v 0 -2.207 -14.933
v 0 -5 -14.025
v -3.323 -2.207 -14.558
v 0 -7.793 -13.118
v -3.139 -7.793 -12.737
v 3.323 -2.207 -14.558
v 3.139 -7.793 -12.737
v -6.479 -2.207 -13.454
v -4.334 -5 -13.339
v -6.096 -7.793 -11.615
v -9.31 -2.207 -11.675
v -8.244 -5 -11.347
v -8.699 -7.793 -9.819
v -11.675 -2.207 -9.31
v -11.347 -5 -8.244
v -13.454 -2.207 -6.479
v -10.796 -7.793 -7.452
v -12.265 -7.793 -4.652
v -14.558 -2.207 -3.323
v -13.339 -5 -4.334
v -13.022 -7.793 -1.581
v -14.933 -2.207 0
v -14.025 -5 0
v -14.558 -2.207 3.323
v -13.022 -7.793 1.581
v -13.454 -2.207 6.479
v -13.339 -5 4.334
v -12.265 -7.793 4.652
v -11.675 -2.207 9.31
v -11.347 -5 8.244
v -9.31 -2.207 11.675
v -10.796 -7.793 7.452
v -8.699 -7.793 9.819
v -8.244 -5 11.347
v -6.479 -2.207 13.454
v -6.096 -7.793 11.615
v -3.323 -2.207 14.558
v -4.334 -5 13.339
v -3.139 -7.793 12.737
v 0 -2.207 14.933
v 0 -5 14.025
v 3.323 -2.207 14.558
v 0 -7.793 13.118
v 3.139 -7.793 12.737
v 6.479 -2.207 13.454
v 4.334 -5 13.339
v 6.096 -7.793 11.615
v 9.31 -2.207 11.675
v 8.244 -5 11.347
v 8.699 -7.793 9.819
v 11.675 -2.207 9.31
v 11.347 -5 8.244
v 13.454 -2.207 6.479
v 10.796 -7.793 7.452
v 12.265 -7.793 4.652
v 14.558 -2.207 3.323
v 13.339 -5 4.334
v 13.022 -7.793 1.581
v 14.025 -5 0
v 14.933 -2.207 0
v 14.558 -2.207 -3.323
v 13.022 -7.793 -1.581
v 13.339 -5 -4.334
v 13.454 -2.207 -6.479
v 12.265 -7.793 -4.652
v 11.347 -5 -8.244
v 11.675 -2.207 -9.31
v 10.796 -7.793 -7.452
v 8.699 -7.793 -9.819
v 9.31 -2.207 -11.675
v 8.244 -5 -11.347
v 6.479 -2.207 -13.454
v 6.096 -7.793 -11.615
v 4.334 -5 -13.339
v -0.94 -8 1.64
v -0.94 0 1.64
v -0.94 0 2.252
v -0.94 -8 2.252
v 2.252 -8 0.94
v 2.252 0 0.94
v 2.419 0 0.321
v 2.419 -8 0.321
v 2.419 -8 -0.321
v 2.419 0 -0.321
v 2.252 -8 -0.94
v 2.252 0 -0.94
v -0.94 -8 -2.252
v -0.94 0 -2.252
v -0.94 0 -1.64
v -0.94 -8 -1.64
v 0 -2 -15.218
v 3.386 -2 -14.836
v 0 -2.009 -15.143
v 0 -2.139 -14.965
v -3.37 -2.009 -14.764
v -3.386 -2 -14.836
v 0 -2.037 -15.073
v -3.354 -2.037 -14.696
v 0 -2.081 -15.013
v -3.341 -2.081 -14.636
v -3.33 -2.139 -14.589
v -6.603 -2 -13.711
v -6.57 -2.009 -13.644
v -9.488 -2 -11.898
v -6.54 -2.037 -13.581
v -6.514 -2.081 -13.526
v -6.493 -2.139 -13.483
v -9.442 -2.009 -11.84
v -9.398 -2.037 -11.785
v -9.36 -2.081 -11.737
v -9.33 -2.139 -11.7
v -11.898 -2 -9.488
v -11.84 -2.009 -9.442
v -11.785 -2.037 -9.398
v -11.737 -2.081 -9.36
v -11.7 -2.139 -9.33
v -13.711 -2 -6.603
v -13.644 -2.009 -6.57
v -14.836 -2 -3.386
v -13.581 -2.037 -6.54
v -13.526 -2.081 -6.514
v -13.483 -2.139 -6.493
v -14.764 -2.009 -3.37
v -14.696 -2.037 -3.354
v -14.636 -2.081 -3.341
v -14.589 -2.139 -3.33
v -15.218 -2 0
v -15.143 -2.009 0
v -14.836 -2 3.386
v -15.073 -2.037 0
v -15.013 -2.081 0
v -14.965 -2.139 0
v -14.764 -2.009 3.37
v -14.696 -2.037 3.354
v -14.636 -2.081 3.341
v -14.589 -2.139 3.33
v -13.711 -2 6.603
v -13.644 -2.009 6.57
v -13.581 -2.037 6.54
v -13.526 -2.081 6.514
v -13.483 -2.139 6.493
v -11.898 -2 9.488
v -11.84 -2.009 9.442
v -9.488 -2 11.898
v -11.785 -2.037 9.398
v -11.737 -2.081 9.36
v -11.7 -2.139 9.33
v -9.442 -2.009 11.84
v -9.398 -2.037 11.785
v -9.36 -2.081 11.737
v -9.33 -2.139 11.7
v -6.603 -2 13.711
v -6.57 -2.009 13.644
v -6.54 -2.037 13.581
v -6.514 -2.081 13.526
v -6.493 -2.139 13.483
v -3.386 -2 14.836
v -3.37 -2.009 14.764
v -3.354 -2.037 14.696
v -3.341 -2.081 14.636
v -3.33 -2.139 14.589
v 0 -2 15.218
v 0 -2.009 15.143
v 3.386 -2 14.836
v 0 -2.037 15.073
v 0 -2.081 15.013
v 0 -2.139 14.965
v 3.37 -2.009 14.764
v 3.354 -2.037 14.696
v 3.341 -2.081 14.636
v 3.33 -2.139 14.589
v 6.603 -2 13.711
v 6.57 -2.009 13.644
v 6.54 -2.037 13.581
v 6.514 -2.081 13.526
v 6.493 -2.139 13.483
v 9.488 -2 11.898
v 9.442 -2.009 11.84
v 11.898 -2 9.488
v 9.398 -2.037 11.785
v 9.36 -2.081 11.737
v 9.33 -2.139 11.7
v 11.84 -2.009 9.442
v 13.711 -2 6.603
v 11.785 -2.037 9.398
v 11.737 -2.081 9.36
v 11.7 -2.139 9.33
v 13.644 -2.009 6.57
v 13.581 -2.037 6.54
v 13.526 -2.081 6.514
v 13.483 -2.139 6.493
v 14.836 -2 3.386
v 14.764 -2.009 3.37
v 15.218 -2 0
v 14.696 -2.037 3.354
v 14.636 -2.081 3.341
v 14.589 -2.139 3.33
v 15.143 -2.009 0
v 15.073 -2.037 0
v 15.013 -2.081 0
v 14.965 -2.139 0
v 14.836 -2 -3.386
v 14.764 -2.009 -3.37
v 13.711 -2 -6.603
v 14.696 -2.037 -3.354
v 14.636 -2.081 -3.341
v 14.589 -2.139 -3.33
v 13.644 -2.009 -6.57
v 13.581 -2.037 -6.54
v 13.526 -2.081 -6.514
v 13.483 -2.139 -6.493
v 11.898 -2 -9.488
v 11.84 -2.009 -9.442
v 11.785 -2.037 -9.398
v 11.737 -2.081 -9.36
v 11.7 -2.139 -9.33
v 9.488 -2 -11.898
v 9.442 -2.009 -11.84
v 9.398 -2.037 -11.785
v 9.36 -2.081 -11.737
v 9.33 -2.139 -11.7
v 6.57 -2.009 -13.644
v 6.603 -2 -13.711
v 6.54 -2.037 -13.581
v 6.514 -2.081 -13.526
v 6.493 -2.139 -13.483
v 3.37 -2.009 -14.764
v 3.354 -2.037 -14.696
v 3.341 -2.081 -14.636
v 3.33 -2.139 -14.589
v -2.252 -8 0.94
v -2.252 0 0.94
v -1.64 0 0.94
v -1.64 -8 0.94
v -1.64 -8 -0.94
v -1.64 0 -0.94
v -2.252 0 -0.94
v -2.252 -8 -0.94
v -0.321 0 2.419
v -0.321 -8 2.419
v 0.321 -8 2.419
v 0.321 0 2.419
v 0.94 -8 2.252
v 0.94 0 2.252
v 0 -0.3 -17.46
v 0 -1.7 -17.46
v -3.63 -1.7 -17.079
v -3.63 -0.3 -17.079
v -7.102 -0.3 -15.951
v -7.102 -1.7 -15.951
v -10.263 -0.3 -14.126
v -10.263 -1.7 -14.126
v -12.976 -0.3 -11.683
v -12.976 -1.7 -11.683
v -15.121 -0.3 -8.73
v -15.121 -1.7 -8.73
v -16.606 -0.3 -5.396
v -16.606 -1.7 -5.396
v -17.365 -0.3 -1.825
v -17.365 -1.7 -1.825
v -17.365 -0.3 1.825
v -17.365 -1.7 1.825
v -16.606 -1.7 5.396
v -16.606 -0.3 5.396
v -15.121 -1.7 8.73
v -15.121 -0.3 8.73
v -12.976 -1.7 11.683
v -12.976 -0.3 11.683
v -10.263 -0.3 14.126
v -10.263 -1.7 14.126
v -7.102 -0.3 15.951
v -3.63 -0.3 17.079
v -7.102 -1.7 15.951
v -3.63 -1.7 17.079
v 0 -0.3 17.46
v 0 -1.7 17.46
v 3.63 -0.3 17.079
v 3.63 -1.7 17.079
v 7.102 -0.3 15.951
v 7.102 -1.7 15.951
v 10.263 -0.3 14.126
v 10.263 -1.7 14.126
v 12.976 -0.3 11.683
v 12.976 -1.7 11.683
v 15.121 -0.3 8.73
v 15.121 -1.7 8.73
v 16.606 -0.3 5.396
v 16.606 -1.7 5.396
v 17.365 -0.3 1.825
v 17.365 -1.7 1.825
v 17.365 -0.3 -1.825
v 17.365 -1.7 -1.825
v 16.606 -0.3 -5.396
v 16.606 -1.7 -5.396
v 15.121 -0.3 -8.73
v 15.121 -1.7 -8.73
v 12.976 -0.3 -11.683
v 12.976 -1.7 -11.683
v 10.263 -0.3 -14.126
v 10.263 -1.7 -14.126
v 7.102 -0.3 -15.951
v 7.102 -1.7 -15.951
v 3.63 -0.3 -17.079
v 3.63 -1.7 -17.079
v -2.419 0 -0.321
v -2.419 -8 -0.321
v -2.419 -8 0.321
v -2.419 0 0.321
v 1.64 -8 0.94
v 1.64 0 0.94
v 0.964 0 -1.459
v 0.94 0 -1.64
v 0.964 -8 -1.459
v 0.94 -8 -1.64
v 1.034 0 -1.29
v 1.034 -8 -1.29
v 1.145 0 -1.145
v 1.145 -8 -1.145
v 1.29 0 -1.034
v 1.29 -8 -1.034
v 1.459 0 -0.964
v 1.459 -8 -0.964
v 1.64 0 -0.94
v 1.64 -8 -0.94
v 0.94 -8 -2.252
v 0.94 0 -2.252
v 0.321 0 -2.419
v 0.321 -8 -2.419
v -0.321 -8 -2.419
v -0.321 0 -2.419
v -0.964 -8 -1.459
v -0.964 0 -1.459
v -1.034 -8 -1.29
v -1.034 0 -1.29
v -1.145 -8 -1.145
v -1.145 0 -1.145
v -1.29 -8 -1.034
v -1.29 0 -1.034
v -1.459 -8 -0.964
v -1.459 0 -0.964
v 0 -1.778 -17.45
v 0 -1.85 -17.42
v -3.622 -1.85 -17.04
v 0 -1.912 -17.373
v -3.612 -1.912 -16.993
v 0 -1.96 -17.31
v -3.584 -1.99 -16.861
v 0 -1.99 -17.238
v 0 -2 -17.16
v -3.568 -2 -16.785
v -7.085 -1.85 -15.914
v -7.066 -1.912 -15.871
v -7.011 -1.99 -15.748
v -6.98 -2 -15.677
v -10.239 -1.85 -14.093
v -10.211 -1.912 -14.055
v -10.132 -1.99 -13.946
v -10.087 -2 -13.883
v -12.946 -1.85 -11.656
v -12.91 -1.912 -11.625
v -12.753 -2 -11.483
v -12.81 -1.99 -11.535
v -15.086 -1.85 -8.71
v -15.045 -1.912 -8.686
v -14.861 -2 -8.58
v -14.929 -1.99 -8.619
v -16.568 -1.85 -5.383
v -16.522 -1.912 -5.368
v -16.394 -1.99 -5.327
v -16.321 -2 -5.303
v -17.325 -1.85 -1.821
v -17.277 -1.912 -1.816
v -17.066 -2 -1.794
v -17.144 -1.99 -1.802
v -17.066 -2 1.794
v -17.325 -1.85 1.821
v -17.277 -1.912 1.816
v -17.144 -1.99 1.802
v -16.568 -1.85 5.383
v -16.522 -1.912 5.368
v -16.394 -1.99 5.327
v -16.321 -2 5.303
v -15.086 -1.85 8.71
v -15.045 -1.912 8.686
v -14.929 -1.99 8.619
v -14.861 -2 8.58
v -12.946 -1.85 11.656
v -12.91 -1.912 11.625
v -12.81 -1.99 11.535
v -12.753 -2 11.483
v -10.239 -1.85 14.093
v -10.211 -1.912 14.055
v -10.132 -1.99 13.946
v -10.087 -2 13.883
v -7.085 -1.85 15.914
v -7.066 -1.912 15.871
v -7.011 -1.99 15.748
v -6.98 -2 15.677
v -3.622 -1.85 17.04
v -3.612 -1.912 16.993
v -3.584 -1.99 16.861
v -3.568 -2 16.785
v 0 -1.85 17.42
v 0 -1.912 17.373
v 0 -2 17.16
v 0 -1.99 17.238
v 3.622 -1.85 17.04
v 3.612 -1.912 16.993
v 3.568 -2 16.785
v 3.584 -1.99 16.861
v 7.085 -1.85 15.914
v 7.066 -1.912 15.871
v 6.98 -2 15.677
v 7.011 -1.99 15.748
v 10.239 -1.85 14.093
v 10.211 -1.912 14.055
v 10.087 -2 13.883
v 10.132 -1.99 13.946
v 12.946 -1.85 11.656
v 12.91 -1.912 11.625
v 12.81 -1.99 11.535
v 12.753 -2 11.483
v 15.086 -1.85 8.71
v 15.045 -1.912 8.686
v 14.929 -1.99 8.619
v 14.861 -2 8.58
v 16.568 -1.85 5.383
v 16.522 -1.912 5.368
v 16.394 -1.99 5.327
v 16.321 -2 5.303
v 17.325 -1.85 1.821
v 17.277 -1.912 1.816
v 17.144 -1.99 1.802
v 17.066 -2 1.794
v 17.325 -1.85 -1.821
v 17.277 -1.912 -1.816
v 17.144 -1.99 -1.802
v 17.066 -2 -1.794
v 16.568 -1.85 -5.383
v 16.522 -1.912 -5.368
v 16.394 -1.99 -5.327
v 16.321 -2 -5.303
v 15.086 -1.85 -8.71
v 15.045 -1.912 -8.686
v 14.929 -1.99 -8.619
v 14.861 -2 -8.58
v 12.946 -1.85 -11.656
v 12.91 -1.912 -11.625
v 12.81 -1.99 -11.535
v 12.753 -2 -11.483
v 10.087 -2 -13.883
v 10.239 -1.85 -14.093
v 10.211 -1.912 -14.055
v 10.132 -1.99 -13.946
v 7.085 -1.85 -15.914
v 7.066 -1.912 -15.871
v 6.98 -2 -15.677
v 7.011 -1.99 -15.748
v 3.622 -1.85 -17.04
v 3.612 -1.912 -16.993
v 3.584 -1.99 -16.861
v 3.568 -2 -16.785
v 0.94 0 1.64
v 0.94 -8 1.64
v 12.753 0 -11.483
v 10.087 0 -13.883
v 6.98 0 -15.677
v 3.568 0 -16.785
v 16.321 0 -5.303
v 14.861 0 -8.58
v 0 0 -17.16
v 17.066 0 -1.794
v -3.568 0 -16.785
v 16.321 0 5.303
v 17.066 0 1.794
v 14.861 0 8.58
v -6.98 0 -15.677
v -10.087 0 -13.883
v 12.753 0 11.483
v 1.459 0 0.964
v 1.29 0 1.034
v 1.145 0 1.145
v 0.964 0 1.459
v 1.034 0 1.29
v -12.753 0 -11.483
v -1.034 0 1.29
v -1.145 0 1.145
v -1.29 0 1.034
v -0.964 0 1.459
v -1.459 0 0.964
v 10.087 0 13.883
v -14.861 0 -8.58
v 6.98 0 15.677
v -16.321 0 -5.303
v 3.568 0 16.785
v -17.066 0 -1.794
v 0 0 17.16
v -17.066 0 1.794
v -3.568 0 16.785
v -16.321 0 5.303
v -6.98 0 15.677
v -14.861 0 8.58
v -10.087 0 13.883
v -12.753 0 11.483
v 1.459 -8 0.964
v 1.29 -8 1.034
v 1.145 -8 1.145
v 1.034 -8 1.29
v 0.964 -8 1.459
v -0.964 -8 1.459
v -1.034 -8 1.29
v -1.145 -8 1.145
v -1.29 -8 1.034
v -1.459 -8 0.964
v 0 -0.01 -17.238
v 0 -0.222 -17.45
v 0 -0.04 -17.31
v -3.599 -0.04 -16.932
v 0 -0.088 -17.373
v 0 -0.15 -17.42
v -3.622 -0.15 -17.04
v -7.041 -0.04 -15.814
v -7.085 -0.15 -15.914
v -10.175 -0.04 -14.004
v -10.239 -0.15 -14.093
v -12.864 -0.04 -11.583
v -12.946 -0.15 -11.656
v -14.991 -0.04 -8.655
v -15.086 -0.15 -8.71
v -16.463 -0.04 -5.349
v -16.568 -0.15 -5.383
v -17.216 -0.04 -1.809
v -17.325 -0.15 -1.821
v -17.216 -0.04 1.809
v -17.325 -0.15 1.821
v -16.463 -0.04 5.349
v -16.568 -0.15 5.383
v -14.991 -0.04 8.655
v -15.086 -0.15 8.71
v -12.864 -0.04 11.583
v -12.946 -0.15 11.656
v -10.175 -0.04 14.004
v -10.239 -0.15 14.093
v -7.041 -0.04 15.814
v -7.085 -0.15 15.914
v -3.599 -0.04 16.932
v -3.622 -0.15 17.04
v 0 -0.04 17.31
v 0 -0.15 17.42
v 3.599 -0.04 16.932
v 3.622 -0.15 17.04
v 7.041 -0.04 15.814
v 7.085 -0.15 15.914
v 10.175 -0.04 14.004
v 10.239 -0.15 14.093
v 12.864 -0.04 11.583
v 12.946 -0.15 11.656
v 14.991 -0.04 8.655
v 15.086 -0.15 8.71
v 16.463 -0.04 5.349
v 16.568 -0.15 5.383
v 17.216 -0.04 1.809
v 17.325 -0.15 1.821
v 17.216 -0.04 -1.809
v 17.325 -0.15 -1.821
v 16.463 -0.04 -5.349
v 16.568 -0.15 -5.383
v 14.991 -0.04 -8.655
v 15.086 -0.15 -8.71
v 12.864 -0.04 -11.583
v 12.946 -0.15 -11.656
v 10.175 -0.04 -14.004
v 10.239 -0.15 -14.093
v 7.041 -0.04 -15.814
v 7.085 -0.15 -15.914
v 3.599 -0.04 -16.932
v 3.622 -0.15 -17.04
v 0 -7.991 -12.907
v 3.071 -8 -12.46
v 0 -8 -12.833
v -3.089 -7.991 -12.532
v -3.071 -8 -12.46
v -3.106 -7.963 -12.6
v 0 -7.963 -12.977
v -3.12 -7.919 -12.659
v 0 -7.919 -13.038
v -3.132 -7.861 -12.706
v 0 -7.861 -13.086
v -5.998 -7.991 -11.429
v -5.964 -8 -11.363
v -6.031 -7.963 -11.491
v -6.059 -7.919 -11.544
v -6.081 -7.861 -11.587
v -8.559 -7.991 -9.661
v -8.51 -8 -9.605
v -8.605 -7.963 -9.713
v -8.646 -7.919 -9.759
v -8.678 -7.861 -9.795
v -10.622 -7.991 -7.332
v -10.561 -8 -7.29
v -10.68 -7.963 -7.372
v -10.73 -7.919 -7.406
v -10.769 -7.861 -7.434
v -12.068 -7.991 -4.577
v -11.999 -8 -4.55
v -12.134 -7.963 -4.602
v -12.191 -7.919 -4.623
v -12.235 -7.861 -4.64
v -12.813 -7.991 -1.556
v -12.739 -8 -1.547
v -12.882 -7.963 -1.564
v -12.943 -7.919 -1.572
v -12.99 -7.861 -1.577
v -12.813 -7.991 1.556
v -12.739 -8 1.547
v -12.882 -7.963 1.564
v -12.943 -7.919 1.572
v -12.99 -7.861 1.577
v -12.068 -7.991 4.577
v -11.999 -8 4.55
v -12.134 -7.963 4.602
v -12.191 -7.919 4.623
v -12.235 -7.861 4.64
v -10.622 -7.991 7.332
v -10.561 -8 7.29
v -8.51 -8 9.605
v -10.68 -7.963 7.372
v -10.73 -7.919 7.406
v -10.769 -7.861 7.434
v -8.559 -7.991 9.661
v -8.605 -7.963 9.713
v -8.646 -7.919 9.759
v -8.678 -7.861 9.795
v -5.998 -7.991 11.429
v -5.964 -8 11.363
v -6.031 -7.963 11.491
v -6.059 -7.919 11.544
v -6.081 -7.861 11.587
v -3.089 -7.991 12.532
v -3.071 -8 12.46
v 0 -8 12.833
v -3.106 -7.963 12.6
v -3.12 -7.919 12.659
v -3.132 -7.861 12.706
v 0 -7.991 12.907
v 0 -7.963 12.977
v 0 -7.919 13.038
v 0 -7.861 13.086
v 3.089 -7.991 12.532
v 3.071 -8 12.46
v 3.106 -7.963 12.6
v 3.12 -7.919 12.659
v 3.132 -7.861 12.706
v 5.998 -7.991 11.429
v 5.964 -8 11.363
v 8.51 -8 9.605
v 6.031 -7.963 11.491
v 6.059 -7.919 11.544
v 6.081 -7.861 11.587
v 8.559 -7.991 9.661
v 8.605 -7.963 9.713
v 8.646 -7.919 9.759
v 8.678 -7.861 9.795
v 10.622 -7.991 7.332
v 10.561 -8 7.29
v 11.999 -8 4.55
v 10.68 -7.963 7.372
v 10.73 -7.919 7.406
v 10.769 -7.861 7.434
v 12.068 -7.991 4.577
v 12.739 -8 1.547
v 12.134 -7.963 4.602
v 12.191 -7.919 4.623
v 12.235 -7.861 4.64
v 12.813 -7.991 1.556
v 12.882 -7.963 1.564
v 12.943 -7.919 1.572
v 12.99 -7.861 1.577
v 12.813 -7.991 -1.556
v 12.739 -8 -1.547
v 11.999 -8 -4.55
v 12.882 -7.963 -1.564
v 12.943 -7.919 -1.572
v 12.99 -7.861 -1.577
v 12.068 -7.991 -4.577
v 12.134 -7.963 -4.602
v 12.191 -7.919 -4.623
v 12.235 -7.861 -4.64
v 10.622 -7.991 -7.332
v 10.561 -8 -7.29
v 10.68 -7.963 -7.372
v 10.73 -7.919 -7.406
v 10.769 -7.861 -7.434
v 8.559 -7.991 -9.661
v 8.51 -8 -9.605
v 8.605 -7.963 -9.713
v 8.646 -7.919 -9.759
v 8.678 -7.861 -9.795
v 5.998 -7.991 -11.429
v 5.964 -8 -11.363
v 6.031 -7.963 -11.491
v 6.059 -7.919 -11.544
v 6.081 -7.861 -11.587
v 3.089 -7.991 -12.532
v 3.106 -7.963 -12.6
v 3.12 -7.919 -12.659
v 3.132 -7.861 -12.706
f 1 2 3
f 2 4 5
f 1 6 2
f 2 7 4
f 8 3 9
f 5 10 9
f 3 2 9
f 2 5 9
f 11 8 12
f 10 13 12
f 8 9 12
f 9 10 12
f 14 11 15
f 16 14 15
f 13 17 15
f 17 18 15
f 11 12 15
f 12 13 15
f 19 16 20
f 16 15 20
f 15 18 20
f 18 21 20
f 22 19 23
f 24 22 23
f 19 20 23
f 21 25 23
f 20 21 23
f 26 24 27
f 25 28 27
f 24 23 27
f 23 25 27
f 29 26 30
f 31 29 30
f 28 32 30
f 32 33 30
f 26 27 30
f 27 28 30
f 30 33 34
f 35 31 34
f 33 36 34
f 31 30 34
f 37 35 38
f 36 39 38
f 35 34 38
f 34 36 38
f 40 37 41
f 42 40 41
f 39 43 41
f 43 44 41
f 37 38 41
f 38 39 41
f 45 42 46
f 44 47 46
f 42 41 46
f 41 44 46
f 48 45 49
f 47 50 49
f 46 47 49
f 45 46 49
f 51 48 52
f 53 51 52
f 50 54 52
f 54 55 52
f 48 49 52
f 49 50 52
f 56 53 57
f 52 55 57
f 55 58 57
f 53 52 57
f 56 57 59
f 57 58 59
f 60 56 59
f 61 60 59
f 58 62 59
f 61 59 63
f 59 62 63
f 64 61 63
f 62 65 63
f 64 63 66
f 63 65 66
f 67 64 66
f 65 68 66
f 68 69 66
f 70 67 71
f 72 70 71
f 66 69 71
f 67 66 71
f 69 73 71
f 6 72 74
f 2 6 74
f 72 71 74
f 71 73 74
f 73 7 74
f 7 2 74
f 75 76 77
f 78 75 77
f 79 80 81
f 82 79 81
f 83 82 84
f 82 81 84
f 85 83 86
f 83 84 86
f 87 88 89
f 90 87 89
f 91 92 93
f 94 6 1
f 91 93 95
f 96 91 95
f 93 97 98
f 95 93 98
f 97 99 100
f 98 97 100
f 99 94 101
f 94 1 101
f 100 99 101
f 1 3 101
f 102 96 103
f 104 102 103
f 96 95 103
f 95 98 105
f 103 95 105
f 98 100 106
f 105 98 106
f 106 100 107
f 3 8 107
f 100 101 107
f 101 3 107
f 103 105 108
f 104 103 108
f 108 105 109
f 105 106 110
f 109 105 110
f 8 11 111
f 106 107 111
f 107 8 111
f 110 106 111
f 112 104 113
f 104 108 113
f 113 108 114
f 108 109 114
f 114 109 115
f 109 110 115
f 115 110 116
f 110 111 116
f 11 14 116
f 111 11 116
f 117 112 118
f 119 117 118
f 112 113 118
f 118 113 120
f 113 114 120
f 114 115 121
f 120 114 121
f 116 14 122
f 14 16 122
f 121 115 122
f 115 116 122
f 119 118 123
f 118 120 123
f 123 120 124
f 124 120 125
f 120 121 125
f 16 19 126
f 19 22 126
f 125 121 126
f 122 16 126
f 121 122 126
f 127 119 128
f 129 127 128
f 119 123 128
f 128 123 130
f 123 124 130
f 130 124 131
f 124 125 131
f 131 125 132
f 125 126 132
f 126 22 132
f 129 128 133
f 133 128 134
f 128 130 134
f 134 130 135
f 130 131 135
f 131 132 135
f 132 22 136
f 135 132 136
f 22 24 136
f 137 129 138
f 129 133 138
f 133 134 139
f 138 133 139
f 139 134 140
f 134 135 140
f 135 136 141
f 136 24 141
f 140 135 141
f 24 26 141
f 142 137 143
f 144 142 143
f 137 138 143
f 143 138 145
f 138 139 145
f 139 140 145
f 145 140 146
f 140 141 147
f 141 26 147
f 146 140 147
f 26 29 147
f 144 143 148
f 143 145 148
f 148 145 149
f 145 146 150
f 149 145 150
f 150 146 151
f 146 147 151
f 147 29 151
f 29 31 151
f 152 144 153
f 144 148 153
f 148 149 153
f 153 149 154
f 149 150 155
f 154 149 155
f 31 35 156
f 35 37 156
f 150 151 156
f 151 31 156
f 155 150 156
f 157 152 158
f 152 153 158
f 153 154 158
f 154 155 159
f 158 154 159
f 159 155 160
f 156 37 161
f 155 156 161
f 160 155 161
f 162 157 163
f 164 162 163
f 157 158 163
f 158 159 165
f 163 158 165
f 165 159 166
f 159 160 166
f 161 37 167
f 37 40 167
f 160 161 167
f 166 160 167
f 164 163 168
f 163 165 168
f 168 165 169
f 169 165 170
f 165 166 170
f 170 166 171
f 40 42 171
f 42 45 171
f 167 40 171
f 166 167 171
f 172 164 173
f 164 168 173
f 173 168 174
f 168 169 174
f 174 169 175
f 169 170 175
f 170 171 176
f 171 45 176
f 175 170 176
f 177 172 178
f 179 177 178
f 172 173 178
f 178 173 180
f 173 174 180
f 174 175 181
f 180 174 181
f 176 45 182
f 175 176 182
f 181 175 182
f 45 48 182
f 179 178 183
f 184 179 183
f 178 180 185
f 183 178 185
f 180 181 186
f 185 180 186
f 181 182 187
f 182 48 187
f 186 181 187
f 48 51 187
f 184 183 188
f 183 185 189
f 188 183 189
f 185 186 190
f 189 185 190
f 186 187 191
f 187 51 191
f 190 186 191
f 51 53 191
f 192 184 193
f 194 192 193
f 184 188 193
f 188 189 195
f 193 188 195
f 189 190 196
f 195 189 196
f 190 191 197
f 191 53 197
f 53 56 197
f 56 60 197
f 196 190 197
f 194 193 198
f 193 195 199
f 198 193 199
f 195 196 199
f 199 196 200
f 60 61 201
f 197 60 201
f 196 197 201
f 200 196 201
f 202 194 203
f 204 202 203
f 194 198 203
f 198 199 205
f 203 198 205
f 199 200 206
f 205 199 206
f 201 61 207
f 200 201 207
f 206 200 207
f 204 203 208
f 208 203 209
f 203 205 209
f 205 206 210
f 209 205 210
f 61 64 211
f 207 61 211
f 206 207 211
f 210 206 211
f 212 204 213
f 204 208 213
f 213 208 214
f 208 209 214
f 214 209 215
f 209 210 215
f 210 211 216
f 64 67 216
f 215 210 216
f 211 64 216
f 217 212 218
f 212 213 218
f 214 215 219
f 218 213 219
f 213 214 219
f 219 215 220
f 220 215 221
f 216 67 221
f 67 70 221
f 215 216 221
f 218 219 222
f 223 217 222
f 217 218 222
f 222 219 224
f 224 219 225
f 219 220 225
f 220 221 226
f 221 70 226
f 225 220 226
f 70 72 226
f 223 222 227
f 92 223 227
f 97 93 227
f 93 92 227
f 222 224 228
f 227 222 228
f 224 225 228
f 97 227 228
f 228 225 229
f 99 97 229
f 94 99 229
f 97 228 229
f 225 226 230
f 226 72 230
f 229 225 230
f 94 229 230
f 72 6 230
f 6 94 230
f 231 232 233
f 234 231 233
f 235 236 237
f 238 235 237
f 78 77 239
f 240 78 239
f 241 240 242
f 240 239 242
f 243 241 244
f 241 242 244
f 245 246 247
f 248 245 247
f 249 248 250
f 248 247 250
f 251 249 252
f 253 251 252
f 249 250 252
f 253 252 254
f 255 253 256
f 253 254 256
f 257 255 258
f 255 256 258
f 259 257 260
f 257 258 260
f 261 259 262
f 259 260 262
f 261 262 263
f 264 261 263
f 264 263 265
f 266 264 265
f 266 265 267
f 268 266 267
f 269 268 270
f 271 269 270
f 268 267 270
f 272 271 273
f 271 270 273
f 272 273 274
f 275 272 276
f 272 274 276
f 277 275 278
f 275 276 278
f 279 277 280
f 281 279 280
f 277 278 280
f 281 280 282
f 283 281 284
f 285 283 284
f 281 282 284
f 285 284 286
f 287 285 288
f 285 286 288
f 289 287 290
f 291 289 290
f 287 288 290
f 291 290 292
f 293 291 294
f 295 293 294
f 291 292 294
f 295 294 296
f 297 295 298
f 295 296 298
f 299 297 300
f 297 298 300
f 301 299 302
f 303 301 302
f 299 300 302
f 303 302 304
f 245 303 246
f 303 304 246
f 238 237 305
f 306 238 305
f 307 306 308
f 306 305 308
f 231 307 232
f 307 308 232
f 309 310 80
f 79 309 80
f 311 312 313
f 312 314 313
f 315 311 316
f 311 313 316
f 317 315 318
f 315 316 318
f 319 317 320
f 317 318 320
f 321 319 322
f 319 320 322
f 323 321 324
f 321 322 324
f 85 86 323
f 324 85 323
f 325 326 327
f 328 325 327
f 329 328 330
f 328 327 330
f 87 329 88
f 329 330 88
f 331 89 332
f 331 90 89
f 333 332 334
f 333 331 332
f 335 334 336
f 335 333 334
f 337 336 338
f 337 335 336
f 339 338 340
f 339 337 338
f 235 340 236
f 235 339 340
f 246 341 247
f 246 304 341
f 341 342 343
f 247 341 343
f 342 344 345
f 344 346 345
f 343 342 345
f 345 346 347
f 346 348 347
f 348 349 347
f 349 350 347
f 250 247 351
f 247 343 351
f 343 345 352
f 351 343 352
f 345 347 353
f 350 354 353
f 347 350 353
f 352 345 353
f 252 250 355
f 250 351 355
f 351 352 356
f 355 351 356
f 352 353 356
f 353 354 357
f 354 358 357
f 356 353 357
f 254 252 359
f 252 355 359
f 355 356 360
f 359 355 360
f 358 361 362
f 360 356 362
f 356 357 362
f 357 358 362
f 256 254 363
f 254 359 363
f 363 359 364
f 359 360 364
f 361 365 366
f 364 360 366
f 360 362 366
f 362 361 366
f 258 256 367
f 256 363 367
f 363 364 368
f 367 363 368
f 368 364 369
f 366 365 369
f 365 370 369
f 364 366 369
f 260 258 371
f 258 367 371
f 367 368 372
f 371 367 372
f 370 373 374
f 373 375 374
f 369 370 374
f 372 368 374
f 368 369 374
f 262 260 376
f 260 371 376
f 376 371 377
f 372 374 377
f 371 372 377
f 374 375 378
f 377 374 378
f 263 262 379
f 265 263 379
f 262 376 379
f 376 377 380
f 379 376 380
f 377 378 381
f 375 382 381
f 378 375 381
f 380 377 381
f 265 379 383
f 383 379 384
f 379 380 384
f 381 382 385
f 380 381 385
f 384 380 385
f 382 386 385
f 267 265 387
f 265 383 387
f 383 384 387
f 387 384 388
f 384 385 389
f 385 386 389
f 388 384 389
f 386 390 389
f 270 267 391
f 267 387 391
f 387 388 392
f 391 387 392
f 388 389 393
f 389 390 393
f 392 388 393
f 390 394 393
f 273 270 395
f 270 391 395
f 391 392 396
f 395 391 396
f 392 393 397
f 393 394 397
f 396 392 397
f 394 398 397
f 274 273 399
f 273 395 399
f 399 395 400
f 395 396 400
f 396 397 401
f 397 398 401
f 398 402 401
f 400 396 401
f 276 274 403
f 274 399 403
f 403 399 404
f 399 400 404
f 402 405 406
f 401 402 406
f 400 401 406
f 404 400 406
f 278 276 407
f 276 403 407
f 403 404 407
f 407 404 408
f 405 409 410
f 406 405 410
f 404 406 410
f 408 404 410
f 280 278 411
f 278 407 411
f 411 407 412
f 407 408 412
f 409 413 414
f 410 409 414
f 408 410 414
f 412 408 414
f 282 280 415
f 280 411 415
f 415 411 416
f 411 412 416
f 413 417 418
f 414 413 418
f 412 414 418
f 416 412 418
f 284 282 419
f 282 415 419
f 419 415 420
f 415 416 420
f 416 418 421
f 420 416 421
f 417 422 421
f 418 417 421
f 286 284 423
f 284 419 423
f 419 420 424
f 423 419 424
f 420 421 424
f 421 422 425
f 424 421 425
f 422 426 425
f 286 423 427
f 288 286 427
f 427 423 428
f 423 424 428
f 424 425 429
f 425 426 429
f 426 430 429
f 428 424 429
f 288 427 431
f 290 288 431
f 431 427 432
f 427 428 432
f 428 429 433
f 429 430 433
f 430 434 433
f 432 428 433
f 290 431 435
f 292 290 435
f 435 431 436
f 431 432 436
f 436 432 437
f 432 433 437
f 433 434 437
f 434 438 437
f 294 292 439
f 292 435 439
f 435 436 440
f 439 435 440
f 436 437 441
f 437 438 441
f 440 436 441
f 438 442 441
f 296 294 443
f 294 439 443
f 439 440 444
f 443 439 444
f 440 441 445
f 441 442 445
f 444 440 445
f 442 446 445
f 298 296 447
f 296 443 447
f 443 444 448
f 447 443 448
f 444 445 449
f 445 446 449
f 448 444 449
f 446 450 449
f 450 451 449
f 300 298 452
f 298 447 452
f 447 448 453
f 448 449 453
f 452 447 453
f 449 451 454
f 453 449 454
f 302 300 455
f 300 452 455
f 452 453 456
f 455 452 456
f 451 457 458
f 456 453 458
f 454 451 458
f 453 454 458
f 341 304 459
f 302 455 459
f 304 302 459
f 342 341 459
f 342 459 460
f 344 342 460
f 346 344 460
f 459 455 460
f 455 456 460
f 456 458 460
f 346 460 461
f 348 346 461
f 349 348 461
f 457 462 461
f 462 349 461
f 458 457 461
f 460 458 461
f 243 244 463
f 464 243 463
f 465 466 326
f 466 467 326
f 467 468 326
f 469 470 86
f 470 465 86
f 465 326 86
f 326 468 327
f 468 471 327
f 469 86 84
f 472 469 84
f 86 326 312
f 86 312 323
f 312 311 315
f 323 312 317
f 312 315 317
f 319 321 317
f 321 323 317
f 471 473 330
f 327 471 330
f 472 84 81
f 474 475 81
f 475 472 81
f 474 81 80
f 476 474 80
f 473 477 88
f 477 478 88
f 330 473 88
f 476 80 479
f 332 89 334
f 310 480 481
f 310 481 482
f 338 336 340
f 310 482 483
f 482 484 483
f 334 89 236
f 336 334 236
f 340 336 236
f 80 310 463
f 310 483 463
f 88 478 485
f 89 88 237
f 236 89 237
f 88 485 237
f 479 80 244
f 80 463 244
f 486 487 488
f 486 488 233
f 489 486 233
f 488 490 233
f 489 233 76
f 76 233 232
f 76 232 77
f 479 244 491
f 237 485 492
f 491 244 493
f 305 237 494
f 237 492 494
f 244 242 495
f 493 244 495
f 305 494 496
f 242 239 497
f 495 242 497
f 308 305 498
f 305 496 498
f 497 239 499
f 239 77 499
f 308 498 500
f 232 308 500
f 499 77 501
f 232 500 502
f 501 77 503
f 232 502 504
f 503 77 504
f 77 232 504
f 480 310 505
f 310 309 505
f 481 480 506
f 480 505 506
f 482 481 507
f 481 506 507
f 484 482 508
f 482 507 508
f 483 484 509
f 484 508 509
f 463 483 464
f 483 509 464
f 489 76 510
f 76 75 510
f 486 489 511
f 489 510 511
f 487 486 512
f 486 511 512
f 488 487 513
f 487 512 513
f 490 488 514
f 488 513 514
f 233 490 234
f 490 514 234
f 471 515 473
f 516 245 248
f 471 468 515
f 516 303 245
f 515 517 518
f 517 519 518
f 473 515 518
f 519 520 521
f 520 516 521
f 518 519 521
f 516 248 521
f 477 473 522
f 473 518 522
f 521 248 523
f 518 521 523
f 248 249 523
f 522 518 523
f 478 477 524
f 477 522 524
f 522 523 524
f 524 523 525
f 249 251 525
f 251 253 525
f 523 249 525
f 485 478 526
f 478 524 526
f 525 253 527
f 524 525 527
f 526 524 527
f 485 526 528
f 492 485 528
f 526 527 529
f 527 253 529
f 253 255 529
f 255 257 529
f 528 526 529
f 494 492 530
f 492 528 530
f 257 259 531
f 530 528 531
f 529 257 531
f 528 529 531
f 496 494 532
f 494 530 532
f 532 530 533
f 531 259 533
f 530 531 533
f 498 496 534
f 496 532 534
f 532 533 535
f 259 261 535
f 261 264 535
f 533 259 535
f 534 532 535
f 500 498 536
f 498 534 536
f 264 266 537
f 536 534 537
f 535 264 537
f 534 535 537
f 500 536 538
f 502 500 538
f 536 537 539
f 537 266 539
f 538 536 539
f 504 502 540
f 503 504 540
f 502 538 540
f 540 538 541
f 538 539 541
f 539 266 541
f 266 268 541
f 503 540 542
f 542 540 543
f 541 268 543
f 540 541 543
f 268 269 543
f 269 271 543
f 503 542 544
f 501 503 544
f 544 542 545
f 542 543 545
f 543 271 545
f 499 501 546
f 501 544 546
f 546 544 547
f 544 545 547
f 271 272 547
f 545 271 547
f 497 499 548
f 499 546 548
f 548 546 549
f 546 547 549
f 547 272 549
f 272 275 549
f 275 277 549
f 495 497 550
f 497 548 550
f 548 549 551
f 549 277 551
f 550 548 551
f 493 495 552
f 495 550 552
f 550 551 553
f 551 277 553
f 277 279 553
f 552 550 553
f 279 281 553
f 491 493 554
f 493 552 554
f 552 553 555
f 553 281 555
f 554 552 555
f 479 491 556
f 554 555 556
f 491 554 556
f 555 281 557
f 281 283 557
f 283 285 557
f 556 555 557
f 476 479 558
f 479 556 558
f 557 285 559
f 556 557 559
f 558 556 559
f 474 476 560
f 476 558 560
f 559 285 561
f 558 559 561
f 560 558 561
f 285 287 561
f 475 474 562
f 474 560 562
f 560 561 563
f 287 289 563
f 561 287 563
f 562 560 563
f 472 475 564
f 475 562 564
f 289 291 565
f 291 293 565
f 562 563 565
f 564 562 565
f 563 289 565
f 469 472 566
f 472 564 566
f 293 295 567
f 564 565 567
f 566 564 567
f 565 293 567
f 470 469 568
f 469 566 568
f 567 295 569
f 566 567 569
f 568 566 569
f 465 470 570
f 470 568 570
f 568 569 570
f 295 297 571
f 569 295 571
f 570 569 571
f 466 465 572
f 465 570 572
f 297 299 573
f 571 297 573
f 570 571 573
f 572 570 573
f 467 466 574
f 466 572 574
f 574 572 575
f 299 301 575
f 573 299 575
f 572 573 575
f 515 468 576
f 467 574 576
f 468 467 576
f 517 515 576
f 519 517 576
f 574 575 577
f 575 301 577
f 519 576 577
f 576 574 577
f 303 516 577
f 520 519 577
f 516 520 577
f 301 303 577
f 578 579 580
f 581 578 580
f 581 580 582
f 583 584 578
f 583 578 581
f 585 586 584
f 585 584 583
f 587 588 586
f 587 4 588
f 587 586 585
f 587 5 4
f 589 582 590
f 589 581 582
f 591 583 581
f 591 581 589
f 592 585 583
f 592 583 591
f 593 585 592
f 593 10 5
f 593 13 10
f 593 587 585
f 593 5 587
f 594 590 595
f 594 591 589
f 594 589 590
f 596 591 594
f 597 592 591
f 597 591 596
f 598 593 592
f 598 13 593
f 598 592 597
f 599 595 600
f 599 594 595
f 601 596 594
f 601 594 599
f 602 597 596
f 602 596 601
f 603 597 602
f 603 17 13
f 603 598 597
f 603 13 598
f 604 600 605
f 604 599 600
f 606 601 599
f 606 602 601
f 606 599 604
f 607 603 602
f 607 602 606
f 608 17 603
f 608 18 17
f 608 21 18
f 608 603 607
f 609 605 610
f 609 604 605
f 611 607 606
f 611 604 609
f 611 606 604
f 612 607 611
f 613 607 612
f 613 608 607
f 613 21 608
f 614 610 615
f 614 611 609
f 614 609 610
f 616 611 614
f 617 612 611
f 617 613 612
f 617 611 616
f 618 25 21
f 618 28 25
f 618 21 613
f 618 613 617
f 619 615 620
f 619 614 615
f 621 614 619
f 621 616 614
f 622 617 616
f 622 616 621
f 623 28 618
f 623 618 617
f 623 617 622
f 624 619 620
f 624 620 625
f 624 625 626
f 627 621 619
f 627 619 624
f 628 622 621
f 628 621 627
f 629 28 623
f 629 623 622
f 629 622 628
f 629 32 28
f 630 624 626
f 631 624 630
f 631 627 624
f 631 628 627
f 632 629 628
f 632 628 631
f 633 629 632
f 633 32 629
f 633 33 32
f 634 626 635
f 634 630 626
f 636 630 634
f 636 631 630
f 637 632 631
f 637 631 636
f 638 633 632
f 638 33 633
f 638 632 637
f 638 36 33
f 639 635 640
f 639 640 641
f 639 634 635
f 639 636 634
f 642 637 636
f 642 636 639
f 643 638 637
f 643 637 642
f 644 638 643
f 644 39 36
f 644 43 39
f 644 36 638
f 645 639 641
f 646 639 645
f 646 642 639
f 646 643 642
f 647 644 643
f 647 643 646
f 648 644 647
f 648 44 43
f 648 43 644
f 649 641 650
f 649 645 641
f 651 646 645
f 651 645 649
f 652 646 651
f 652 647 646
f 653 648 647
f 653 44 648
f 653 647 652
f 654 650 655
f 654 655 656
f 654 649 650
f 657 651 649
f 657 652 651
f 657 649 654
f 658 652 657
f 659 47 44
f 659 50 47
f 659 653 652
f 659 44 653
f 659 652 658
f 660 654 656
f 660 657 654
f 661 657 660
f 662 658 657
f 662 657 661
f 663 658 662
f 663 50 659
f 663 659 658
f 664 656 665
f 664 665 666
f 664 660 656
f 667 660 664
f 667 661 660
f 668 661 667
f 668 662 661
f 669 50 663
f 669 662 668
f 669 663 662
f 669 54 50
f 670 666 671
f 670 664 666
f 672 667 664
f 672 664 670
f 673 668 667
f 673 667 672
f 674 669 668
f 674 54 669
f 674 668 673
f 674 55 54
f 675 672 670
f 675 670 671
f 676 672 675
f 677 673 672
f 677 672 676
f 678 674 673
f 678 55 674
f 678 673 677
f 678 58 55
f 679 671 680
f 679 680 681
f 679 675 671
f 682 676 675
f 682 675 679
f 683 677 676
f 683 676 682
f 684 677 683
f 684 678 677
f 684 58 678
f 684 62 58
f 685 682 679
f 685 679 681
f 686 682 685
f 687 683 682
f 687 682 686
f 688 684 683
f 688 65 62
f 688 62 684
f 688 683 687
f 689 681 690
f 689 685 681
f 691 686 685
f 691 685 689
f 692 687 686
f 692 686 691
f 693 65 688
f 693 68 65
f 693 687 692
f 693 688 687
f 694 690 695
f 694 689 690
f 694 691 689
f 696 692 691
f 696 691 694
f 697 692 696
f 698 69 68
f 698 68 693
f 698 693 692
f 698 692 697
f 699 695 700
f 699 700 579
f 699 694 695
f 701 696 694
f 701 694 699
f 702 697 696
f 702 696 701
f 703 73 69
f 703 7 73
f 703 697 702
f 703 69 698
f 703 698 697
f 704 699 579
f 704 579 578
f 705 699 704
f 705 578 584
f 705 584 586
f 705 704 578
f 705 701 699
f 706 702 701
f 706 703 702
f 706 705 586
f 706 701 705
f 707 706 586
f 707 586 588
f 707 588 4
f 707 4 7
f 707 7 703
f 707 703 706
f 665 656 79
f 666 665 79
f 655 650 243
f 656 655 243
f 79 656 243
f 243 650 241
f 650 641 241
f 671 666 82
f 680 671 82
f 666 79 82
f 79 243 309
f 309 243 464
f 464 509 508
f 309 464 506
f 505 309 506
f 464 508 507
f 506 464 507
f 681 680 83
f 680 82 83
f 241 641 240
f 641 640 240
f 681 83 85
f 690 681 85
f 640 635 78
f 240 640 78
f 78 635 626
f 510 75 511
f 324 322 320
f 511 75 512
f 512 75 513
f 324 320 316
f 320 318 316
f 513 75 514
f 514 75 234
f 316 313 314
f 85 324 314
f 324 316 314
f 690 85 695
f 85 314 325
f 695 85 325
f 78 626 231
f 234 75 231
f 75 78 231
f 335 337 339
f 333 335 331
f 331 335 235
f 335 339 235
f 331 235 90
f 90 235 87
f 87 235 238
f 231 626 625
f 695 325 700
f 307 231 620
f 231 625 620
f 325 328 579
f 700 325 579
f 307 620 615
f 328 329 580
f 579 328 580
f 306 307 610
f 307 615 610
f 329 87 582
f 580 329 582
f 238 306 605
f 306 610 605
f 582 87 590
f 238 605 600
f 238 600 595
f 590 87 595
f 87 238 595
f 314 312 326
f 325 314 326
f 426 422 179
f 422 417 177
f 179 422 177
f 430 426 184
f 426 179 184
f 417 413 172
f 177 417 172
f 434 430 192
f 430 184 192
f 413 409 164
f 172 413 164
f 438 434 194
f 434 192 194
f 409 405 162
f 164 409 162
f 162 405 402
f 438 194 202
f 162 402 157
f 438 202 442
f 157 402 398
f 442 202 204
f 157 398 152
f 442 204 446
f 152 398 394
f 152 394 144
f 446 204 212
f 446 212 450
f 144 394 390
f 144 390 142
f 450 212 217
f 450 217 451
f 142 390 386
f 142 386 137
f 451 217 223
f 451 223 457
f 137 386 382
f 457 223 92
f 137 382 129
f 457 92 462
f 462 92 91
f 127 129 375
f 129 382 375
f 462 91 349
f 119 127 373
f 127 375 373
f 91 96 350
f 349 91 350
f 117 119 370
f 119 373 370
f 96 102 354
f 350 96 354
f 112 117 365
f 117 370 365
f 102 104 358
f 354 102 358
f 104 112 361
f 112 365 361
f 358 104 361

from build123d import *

# Parameters (mm, degrees)
CUT_EXTRUDE1_DEPTH = 26.956426849
FILLET1_R          = 0.7
FILLET2_R          = 0.3


with BuildPart() as part:
    # Sketch2 → Revolve1 (revolve)
    with BuildSketch(Plane.XY, mode=Mode.PRIVATE) as revolve1_sk:
        Polygon((0, 0), (17.460470996, 0), (17.460470996, -2), (15, -2), (13.050481823, -8), (0, -8), align=None)
    revolve(revolve1_sk.sketch.rotate(Axis((0, 0, 0), (0, 1, 0)), 90), axis=Axis((0, 0, 0), (0, 1, 0)))

    # Sketch1 → Cut-Extrude1 (cut, through all)
    with BuildSketch(Plane(origin=(0, 0, 0), x_dir=(1, 0, 0), z_dir=(0, 1, 0))):
        with BuildLine():
            Line((-0.94, 0.94), (-2.25166605, 0.94))
            ThreePointArc((-2.25166605, 0.94), (-2.44, 0), (-2.25166605, -0.94))
            Line((-2.25166605, -0.94), (-0.94, -0.94))
            Line((-0.94, -0.94), (-0.94, -2.25166605))
            ThreePointArc((-0.94, -2.25166605), (0, -2.44), (0.94, -2.25166605))
            Line((0.94, -2.25166605), (0.94, -0.94))
            Line((0.94, -0.94), (2.25166605, -0.94))
            ThreePointArc((2.25166605, -0.94), (2.44, 0), (2.25166605, 0.94))
            Line((2.25166605, 0.94), (0.94, 0.94))
            Line((0.94, 0.94), (0.94, 2.25166605))
            ThreePointArc((0.94, 2.25166605), (0, 2.44), (-0.94, 2.25166605))
            Line((-0.94, 2.25166605), (-0.94, 0.94))
        make_face()
    extrude(amount=-CUT_EXTRUDE1_DEPTH, mode=Mode.SUBTRACT)

    # Fillet1
    fillet1_edges = [part.edges().sort_by_distance(p)[0] for p in [
        (-0.94, -4, -0.94),
        (0.94, -4, -0.94),
        (0.94, -4, 0.94),
        (-0.94, -4, 0.94),
    ]]
    fillet(fillet1_edges, radius=FILLET1_R)

    # Fillet2
    fillet2_edges = [part.edges().sort_by_distance(p)[0] for p in [
        (0, -8, 13.050481823),
        (0, -2, 15),
        (0, -2, 17.460470996),
        (0, 0, 17.460470996),
    ]]
    fillet(fillet2_edges, radius=FILLET2_R)


solid = part.part
